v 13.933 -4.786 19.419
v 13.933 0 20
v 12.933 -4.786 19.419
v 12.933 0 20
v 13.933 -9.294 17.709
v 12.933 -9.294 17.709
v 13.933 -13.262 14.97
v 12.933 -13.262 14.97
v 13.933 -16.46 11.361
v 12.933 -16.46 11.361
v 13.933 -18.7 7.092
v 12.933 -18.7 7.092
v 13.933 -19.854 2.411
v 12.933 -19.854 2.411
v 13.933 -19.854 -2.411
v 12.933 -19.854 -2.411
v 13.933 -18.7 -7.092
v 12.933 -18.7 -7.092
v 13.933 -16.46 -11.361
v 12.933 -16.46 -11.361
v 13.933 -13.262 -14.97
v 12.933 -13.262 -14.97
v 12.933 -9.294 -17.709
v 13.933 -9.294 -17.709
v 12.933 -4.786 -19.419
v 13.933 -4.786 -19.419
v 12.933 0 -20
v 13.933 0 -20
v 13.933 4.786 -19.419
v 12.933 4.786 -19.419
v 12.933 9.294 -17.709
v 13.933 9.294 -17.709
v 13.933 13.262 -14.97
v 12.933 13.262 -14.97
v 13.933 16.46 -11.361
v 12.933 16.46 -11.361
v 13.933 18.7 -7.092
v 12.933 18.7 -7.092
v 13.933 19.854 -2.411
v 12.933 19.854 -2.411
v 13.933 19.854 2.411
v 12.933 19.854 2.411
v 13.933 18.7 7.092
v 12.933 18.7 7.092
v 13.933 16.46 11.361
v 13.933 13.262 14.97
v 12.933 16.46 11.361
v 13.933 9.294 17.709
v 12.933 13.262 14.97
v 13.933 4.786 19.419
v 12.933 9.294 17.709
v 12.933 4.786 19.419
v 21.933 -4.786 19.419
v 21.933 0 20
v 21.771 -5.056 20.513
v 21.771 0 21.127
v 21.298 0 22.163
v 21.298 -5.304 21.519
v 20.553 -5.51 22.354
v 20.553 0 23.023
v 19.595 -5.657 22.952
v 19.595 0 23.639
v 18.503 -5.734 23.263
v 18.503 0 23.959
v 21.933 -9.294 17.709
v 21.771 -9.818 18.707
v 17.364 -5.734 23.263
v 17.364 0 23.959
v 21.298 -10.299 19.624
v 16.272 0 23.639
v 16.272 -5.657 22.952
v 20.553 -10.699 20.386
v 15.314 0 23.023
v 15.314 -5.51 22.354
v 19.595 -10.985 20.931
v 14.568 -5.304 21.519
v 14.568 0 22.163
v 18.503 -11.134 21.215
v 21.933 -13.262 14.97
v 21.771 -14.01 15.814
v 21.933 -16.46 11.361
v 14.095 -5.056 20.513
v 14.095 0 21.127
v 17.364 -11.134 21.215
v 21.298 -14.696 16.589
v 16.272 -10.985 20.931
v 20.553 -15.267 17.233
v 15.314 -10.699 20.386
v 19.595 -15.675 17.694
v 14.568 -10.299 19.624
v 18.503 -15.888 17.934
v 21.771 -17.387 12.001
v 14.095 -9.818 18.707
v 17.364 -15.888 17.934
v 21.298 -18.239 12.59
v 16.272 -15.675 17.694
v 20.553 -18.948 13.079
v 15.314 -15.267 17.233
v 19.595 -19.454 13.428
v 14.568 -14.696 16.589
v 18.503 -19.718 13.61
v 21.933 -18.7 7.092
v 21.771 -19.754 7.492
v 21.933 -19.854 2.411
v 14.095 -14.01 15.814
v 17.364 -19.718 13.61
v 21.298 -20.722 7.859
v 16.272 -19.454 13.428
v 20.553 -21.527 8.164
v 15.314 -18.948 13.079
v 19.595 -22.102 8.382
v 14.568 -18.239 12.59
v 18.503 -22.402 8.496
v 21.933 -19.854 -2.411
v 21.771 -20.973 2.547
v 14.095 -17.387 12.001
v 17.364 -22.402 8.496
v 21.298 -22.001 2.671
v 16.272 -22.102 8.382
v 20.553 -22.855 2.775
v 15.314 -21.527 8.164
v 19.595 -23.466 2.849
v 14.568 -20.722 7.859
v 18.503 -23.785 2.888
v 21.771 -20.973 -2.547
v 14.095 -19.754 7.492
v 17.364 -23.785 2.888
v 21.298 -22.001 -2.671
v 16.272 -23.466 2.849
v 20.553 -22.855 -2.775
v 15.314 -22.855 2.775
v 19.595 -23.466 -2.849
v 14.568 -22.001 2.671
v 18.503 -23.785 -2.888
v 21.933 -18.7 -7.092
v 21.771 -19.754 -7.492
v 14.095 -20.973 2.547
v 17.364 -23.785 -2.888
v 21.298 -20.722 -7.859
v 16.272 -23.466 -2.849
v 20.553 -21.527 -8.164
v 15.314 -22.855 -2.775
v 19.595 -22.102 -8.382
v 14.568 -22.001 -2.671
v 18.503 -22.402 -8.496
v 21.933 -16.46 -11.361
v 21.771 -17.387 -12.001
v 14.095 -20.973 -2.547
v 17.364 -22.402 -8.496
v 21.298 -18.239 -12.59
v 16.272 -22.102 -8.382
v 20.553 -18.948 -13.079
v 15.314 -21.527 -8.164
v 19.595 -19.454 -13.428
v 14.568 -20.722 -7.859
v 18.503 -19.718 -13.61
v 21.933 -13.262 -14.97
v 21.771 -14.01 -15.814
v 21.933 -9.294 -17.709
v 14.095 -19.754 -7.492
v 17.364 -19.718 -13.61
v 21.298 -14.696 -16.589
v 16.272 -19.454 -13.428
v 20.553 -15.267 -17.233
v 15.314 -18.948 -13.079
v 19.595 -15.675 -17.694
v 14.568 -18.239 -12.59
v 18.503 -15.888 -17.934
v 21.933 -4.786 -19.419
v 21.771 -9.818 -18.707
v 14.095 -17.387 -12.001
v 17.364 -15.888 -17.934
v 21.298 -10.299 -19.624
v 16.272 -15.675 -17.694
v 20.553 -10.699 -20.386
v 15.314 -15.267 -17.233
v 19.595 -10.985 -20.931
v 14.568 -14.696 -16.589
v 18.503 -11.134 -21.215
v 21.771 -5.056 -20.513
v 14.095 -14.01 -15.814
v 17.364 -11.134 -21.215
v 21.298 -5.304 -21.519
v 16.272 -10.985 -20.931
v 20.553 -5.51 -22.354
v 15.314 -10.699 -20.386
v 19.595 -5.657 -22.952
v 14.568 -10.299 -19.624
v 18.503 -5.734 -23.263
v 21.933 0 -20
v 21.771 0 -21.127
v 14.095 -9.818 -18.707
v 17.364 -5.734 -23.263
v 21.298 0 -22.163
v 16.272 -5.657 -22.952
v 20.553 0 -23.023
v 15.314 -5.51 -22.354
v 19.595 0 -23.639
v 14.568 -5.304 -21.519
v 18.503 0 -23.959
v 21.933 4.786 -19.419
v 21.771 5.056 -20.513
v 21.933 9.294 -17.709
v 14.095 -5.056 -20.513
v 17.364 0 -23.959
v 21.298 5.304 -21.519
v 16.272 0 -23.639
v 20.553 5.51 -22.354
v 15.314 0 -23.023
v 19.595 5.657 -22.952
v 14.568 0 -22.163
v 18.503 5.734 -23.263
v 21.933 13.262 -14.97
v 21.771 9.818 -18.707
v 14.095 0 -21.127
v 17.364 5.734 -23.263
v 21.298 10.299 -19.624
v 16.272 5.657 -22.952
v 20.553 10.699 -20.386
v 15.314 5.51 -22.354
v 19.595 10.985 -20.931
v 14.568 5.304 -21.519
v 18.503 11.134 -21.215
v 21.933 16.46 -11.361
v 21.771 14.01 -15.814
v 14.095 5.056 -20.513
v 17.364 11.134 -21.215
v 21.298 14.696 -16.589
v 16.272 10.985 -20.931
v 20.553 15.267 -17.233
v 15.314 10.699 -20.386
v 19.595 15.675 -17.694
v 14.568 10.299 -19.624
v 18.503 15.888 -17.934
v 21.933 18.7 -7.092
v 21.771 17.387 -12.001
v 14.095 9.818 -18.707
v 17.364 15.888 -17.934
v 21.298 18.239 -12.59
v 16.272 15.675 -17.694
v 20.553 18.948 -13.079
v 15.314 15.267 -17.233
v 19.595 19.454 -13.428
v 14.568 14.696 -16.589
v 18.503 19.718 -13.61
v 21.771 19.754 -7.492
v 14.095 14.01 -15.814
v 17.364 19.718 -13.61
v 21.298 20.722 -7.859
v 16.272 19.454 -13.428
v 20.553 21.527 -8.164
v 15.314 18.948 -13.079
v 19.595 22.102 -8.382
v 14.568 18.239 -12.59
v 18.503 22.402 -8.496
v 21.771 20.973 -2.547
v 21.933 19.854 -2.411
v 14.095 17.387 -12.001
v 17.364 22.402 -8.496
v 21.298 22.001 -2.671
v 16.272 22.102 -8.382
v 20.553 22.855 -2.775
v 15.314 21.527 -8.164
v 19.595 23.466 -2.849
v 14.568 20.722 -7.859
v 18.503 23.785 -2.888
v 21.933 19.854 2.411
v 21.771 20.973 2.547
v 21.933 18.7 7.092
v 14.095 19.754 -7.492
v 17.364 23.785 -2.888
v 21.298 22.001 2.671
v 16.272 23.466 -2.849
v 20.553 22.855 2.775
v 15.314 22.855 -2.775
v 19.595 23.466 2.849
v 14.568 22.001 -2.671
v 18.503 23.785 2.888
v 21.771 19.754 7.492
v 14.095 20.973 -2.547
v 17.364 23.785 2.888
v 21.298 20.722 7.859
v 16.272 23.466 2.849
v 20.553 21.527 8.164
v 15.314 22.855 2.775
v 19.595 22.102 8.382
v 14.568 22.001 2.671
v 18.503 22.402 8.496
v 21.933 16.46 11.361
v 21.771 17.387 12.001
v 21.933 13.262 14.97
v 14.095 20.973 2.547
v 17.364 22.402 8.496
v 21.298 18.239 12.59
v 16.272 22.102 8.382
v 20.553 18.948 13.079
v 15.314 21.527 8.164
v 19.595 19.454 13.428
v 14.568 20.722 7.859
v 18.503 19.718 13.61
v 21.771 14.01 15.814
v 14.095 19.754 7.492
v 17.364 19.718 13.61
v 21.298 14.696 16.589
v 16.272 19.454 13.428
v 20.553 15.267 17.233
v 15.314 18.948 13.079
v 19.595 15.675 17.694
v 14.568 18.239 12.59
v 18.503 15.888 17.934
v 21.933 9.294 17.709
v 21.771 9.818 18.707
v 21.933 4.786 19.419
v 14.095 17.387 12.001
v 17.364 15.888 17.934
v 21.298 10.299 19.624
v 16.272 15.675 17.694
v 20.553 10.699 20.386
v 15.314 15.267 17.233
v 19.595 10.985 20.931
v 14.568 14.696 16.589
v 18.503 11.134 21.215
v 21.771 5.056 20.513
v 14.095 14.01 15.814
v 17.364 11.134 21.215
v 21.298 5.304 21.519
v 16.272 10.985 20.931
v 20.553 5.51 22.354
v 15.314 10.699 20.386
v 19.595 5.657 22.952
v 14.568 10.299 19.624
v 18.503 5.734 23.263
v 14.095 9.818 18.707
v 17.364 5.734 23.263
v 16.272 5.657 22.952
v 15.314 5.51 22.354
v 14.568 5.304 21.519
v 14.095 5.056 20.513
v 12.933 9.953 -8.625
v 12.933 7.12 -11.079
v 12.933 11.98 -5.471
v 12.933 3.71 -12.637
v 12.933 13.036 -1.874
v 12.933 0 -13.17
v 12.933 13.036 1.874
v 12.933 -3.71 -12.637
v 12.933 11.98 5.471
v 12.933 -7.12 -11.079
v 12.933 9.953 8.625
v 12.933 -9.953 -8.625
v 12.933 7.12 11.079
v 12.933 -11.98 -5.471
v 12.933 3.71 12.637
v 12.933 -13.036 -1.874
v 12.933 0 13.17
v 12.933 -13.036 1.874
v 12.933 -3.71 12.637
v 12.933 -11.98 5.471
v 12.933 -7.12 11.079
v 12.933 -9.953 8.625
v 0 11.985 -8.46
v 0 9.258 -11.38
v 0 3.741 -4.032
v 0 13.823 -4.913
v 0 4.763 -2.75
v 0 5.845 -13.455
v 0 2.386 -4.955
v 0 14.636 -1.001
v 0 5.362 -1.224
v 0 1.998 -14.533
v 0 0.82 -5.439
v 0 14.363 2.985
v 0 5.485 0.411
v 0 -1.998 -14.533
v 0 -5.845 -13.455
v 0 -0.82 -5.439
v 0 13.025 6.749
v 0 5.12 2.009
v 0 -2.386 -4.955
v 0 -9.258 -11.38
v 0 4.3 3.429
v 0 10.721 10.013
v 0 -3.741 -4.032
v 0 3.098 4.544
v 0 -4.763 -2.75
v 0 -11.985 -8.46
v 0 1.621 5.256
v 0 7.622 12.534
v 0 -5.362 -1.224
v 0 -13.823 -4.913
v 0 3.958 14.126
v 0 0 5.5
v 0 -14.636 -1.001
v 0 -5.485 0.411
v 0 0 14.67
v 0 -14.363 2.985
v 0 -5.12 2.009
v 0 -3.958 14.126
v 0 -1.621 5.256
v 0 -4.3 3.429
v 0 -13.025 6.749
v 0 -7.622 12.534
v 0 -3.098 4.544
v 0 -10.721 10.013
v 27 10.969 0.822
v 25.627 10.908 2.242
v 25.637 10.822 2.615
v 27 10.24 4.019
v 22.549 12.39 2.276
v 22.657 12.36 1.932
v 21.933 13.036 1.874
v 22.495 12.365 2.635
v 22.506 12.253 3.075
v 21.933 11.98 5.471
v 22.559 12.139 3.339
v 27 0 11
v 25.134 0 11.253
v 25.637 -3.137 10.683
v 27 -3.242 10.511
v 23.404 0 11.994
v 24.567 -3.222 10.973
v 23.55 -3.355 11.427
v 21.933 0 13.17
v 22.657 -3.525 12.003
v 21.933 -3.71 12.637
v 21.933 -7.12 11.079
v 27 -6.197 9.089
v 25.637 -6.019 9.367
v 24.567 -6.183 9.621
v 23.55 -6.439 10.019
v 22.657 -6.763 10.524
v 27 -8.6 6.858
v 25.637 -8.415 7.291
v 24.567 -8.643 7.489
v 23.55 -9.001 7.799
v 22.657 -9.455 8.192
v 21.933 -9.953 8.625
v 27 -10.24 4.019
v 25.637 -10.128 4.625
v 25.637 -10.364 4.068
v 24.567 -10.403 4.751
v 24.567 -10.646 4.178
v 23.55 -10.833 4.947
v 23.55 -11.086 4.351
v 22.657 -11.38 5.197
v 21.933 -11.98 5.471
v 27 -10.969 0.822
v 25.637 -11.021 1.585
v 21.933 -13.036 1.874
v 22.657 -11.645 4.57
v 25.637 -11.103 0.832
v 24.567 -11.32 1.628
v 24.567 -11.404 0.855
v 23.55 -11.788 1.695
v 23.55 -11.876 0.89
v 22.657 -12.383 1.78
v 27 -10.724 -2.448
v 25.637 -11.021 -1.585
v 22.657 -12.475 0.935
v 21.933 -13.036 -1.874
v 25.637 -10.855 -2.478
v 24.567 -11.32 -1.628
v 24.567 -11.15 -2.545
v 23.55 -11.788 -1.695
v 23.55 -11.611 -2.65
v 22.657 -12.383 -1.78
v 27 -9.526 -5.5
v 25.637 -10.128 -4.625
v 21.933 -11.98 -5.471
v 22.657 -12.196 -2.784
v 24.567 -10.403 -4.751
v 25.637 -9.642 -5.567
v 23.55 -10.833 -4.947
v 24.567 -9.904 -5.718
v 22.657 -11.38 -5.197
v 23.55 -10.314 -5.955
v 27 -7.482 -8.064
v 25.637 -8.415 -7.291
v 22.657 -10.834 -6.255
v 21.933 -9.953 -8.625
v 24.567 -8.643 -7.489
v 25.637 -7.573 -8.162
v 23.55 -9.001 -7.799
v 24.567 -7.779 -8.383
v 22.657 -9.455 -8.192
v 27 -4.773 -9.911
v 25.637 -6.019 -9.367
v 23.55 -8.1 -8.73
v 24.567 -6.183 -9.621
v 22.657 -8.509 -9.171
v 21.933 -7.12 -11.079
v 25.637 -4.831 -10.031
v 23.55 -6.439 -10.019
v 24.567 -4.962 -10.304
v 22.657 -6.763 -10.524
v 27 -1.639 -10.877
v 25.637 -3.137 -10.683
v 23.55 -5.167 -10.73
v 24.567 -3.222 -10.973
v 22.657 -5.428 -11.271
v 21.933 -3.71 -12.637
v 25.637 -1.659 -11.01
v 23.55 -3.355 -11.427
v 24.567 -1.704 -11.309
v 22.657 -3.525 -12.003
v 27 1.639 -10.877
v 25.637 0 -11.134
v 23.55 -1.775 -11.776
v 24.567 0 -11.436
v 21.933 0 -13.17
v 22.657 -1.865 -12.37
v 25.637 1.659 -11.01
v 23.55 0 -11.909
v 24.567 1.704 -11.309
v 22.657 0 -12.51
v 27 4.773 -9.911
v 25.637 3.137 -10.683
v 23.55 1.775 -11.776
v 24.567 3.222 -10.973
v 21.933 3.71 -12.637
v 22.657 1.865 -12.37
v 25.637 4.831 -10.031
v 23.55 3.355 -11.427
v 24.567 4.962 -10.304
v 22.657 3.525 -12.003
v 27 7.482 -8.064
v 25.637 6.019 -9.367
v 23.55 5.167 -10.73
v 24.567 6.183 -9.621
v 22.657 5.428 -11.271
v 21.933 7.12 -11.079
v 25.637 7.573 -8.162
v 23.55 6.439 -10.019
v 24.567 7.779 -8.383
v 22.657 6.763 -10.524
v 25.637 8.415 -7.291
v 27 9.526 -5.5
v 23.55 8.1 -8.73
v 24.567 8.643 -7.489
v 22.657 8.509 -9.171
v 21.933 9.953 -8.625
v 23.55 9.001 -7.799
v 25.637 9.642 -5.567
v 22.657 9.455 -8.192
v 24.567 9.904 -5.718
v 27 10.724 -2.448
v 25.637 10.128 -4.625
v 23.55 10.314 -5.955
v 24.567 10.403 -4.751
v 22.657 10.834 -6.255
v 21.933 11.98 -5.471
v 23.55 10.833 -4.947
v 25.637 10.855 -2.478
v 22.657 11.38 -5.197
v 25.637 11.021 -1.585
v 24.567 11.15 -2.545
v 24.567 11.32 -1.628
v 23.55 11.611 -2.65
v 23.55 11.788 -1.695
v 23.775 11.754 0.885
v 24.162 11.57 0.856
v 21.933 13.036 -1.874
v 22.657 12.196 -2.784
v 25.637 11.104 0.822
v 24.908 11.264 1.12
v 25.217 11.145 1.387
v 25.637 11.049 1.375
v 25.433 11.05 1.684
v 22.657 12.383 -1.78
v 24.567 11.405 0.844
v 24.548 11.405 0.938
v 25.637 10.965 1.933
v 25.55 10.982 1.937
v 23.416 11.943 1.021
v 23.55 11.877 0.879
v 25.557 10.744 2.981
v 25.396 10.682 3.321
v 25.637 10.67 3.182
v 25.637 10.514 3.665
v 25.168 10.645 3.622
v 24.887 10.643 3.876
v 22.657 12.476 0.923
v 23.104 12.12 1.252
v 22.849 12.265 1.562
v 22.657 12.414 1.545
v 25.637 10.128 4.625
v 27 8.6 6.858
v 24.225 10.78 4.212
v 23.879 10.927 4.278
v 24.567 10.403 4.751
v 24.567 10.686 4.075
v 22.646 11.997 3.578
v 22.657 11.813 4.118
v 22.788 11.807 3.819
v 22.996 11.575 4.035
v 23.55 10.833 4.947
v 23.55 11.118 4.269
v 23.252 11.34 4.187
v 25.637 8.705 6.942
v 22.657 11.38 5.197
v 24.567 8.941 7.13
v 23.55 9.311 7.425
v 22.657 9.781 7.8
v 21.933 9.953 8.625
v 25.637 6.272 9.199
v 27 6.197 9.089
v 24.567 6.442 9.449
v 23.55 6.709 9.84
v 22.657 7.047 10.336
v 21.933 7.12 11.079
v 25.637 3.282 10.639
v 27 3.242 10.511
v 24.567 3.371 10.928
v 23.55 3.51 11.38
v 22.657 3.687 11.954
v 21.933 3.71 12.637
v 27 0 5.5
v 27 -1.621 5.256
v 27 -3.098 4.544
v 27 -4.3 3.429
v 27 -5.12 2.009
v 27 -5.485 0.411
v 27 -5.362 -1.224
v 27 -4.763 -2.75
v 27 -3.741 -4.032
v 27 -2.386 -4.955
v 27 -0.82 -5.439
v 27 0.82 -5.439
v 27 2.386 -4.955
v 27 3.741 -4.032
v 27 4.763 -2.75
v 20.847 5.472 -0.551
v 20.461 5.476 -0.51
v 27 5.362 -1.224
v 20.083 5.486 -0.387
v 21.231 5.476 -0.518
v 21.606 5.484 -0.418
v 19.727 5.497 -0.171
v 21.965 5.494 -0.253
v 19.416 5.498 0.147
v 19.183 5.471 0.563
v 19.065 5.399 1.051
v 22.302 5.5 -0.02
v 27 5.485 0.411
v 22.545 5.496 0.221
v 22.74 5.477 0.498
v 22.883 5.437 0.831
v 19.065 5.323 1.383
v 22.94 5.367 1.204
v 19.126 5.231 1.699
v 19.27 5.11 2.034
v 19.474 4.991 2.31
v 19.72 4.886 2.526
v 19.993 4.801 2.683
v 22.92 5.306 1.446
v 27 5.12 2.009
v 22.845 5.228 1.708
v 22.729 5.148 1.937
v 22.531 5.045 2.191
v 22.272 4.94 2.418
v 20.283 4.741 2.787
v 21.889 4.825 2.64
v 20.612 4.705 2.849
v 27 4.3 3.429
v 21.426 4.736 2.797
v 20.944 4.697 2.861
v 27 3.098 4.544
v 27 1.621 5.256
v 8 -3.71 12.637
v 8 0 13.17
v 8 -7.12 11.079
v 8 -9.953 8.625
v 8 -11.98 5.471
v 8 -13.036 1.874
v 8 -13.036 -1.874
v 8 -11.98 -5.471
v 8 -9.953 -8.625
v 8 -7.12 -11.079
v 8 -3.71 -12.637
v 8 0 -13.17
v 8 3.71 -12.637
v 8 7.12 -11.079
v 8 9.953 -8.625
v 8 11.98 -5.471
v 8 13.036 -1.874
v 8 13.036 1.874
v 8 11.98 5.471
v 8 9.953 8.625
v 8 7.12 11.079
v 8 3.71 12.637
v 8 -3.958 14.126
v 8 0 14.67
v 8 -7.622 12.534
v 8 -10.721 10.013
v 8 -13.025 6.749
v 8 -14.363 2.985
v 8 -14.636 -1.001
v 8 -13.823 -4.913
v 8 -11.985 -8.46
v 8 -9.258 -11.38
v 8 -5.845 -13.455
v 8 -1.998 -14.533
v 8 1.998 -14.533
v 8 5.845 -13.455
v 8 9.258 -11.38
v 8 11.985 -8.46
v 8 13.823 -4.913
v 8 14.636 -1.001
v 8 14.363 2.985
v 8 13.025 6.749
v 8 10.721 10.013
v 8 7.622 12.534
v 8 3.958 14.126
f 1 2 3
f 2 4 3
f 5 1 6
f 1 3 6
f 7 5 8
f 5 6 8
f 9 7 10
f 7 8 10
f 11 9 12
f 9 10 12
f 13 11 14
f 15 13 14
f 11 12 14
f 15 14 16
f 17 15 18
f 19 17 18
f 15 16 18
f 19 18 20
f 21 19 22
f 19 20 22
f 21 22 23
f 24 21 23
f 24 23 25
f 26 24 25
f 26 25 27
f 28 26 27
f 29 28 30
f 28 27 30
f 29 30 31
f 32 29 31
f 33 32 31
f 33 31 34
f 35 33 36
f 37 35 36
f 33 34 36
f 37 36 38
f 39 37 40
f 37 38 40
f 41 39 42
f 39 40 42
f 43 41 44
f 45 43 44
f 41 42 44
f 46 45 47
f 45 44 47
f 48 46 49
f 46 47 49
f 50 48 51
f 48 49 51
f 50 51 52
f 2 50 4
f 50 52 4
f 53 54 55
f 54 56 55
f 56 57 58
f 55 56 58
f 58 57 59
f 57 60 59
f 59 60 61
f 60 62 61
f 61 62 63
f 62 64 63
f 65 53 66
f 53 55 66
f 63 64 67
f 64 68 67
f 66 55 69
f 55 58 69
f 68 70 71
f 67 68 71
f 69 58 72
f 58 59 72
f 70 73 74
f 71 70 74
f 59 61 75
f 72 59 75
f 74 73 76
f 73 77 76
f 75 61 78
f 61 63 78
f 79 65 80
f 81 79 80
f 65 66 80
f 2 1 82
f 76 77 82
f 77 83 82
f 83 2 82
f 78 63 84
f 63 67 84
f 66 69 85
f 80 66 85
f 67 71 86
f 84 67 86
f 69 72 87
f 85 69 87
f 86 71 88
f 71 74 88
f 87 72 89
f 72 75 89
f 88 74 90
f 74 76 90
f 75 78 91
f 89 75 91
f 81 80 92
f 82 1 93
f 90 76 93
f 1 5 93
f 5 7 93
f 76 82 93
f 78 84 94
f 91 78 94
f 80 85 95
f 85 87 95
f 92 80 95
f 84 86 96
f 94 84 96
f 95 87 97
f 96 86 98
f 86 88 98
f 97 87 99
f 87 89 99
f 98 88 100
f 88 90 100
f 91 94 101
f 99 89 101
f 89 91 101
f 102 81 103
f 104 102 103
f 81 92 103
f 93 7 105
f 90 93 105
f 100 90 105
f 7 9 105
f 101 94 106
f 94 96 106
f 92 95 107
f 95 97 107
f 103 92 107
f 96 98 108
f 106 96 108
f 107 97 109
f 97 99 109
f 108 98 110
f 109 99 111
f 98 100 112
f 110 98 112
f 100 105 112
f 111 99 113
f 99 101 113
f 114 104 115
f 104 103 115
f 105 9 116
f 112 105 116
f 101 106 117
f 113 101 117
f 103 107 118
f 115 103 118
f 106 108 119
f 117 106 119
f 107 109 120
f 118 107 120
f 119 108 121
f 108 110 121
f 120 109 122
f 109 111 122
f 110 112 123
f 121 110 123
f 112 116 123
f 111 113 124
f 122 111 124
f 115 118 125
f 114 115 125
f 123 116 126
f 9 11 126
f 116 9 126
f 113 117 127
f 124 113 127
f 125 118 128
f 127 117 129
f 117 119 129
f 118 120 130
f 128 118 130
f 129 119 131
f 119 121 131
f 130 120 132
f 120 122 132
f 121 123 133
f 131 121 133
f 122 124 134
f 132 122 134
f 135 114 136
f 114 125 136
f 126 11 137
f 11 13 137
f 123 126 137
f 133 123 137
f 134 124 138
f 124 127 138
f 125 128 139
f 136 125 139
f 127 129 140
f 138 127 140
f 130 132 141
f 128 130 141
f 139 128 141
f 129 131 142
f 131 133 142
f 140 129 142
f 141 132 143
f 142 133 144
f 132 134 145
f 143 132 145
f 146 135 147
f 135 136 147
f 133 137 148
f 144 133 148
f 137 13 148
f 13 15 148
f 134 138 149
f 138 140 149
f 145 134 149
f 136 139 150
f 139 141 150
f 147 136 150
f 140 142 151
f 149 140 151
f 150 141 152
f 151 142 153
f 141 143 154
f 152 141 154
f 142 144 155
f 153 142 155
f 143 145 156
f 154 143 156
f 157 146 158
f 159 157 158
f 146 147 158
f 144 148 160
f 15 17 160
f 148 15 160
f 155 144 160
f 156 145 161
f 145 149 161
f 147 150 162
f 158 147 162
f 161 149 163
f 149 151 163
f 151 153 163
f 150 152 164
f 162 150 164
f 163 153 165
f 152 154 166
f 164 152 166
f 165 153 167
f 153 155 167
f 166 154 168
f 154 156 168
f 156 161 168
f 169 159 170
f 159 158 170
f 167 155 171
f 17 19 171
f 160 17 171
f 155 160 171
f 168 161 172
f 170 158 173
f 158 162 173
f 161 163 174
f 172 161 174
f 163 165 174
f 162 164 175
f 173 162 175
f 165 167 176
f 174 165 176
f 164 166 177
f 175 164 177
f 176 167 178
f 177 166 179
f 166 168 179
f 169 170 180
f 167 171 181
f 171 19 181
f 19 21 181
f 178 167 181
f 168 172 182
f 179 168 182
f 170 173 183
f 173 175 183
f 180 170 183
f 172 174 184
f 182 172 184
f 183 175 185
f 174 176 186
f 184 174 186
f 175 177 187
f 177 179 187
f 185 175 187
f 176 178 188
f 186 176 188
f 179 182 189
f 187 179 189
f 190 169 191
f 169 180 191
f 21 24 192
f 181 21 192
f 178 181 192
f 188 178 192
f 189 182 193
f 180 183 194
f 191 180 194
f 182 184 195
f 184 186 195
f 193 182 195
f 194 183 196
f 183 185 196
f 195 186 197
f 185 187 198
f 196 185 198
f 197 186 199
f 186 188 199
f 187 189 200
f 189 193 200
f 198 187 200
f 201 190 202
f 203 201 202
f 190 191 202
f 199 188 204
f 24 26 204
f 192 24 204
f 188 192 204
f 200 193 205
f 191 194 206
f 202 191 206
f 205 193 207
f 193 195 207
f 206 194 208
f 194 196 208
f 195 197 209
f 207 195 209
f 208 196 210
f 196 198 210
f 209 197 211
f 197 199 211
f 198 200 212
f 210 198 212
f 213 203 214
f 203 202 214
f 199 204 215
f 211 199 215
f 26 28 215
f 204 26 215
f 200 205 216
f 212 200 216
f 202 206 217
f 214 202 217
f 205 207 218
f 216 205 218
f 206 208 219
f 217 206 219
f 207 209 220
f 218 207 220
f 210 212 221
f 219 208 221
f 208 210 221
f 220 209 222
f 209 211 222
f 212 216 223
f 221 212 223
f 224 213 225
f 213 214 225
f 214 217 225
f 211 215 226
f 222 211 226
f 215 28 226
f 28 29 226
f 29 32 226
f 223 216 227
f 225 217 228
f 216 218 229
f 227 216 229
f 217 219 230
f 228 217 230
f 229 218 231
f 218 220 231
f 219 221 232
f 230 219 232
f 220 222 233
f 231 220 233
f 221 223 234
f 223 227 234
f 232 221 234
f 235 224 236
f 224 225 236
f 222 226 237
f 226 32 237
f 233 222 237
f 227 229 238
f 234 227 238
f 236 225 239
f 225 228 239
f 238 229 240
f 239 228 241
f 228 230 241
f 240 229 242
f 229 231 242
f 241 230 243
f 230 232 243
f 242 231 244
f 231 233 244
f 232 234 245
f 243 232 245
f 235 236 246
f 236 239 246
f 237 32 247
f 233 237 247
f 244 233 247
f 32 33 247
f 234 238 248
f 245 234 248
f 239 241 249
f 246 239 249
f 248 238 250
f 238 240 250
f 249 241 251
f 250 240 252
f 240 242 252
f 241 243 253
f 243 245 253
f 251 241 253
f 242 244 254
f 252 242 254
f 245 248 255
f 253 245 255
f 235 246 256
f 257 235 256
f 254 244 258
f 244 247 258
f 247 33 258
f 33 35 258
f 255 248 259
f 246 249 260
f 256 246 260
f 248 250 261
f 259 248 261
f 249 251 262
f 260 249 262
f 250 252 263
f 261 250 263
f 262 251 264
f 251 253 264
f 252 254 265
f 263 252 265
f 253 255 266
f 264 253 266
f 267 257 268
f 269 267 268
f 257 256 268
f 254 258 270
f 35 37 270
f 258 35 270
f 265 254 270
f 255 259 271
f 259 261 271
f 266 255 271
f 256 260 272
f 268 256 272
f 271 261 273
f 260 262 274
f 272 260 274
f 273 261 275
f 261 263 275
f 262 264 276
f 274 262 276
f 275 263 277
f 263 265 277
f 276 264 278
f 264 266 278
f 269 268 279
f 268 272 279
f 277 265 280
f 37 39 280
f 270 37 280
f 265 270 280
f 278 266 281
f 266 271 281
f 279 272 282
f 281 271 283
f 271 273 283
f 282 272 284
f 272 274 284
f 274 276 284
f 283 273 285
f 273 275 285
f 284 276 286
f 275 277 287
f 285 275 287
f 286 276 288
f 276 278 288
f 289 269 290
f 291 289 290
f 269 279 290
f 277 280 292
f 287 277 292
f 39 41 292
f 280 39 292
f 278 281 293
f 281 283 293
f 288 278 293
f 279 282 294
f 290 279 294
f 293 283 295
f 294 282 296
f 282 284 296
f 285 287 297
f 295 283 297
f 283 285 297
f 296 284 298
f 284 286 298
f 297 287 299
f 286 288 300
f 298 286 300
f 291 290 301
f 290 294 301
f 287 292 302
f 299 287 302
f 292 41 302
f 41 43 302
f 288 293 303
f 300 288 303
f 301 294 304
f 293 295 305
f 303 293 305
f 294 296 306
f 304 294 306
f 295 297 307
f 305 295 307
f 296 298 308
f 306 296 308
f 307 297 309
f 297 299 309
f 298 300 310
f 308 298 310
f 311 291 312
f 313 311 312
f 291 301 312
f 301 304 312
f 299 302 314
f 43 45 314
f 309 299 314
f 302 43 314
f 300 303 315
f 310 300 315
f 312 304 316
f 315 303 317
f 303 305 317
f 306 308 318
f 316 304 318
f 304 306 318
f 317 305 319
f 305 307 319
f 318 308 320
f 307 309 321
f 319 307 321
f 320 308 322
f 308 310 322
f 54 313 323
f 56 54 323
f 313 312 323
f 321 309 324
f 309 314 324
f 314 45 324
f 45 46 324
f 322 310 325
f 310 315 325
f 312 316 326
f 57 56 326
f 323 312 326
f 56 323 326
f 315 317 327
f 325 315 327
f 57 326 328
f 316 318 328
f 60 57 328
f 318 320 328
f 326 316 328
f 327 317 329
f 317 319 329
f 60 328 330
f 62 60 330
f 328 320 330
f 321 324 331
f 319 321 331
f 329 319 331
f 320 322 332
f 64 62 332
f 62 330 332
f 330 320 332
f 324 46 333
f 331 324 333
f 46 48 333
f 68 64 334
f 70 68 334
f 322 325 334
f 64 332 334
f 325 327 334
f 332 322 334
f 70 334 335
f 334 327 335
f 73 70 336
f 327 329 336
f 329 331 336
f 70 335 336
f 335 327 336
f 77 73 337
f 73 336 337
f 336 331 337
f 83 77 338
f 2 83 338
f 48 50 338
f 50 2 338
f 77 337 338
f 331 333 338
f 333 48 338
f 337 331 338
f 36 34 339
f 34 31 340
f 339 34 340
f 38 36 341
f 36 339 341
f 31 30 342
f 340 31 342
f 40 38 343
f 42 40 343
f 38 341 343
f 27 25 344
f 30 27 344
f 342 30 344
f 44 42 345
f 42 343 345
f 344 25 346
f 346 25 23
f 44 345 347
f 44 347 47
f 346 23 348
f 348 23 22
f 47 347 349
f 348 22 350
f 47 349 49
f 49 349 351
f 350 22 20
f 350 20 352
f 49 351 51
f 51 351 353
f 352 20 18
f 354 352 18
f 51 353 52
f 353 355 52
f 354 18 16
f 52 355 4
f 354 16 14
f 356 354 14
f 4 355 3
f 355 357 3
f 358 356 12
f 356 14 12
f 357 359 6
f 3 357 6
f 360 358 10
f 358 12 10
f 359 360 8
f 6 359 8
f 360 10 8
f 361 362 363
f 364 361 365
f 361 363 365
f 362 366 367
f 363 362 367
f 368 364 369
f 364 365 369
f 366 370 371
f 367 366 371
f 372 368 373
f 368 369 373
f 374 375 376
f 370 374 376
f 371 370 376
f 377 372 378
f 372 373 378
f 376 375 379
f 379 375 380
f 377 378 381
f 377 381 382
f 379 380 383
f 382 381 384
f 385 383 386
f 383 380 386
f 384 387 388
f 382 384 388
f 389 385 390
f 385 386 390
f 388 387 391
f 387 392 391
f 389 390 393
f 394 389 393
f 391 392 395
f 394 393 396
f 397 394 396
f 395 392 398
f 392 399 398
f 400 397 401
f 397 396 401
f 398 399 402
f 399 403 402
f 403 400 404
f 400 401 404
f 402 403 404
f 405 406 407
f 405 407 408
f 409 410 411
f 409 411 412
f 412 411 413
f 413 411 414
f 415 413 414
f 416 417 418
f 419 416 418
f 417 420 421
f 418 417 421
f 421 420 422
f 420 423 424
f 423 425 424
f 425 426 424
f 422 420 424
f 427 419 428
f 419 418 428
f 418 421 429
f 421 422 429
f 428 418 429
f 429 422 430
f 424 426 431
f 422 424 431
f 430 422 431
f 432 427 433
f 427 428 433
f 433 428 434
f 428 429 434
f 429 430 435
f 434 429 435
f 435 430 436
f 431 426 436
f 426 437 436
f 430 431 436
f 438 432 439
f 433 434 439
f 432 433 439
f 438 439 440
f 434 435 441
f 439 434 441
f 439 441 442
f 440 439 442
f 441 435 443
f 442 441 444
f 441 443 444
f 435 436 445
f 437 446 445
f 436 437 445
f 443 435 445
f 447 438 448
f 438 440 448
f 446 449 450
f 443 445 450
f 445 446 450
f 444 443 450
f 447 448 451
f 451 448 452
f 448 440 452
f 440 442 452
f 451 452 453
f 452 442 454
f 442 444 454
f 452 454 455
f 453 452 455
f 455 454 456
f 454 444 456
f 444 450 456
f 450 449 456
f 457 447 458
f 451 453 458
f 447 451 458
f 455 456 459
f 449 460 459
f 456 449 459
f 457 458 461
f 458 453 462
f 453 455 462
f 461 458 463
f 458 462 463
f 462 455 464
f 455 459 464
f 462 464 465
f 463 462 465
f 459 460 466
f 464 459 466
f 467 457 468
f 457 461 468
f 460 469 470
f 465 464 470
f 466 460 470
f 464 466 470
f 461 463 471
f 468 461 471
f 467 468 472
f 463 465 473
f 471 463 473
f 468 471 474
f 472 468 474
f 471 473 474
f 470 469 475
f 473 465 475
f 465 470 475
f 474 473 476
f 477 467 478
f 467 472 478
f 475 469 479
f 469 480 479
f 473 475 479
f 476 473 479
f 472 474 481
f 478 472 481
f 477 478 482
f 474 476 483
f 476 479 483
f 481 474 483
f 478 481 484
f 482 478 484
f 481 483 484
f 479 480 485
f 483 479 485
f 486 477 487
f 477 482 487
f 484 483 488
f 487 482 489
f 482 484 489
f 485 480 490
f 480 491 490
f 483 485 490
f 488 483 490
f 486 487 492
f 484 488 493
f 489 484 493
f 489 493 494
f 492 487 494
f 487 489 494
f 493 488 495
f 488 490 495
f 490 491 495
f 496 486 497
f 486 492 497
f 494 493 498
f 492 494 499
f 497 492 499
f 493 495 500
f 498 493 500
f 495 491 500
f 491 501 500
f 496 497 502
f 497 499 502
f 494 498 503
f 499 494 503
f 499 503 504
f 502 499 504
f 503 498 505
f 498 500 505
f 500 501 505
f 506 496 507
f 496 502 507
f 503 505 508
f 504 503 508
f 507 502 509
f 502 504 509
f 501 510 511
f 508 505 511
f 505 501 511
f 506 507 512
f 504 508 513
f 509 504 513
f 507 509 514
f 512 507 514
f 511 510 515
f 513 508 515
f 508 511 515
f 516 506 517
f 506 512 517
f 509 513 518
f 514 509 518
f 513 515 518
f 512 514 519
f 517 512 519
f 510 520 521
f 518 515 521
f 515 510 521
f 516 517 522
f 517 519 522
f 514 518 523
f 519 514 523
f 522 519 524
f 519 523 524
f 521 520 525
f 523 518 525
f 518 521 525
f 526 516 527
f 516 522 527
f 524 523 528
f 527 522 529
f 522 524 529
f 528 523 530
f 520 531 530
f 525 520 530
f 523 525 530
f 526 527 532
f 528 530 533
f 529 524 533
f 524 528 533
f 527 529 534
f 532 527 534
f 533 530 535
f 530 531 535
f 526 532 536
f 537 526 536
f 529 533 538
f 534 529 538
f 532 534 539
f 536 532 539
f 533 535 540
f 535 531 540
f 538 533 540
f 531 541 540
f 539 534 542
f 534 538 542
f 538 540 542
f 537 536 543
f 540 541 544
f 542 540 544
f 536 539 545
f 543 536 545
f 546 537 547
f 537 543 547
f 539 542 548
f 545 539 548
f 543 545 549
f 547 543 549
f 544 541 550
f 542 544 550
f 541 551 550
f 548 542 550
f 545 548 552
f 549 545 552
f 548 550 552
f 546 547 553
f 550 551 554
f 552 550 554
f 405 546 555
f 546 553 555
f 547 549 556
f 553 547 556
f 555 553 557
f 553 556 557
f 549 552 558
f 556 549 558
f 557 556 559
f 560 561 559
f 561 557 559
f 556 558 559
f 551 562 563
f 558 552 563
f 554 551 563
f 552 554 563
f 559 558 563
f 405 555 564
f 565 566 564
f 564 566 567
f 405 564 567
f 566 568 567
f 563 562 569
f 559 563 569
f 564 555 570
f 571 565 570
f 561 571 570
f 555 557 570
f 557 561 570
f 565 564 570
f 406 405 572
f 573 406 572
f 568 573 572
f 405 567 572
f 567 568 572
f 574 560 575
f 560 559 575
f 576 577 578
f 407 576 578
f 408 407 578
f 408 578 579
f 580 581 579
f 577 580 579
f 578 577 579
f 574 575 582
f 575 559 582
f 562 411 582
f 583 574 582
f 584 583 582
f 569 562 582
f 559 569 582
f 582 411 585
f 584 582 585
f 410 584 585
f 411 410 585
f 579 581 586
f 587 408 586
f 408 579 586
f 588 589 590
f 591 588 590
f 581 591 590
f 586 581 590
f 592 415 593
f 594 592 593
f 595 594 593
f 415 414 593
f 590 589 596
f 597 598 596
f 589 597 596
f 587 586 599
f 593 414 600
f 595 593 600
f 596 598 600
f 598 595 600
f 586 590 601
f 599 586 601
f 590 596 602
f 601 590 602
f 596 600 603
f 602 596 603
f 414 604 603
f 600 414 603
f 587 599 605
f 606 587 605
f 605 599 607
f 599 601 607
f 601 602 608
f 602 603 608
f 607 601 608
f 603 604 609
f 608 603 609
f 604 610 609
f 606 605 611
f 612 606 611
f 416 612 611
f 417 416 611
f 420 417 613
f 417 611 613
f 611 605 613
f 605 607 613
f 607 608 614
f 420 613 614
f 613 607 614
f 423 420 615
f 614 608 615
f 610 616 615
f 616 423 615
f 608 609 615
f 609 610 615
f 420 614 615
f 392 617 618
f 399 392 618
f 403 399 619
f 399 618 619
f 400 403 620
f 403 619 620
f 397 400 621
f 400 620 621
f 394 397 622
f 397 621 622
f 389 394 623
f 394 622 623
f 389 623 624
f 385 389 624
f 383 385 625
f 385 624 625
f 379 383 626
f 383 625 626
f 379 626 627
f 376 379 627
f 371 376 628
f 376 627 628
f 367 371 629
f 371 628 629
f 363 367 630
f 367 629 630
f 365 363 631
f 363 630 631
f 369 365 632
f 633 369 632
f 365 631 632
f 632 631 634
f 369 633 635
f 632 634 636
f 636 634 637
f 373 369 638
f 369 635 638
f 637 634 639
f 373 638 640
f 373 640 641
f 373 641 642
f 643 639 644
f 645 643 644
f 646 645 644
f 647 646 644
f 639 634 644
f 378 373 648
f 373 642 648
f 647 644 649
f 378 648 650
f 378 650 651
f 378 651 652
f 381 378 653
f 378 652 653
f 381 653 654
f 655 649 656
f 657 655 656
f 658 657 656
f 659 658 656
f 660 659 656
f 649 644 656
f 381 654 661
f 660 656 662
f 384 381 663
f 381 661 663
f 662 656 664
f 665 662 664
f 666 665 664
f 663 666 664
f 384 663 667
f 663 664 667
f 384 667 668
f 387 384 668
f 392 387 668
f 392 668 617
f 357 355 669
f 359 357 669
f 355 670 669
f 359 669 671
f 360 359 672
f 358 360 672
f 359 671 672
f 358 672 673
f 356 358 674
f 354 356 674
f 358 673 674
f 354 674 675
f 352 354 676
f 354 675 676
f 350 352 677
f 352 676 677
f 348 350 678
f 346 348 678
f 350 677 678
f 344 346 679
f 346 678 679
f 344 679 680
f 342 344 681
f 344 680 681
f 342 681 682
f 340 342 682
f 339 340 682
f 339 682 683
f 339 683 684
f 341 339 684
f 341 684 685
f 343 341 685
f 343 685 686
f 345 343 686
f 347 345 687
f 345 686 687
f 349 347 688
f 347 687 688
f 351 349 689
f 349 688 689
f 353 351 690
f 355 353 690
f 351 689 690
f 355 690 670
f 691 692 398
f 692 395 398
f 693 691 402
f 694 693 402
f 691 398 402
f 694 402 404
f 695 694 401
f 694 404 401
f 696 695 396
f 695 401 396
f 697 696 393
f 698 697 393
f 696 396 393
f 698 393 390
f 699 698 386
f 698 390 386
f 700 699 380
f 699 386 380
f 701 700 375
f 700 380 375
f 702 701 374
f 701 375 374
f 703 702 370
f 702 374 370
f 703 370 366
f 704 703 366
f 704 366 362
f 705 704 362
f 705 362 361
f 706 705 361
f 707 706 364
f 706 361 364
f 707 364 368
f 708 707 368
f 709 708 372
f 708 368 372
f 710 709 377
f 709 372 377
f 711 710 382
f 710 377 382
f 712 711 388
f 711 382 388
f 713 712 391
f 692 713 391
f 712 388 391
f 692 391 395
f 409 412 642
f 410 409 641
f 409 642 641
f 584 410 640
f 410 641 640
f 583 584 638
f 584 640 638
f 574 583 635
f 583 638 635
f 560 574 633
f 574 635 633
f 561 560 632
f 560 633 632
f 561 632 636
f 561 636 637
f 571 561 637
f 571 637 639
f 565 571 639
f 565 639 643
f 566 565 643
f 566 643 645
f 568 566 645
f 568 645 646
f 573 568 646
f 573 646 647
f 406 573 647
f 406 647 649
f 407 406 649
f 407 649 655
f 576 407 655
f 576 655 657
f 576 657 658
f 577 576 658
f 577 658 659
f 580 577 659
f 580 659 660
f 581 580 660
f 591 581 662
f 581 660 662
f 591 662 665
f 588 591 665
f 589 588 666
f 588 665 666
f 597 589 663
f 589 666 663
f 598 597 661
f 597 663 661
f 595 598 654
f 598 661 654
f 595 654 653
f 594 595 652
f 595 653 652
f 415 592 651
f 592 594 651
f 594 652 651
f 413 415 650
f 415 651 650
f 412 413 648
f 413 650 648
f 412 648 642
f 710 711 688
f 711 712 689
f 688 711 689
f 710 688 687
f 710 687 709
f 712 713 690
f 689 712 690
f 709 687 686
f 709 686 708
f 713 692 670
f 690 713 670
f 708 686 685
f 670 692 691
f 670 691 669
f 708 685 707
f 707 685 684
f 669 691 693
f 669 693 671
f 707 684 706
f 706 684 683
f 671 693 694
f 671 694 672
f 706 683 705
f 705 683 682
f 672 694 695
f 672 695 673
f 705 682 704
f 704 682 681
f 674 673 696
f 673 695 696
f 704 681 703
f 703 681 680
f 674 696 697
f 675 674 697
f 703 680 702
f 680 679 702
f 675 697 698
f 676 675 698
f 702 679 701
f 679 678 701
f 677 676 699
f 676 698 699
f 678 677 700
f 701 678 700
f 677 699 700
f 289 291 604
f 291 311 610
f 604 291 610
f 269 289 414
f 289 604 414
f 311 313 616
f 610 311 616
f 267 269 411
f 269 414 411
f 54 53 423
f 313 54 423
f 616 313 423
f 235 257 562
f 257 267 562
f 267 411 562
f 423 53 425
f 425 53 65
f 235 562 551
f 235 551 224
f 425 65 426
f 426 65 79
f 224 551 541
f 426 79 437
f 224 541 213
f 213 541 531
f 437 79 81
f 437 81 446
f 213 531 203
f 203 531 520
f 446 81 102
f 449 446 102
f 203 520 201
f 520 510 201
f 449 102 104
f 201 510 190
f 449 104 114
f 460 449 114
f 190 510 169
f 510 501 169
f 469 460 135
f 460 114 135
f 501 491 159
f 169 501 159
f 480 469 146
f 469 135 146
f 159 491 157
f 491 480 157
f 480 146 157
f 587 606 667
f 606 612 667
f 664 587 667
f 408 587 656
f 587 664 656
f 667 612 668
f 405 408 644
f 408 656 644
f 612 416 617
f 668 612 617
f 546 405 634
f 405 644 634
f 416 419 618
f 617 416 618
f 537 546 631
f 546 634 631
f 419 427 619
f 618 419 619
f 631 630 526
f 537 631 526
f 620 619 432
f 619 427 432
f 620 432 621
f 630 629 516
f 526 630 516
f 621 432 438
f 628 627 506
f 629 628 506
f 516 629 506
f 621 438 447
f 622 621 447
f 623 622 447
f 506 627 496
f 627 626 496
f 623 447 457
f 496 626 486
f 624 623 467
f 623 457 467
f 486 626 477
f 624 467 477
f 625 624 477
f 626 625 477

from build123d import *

# Parameters (mm, degrees)
F_3_5_3_5_DIAMETER_HOLE1_D     = 3.5
F_3_5_3_5_DIAMETER_HOLE1_DEPTH = 12
F_3_5_3_5_DIAMETER_HOLE1_TIP   = 1.75


with BuildPart() as part:
    # Sketch2 → Revolve1 (revolve)
    with BuildSketch(Plane.XY, mode=Mode.PRIVATE) as revolve1_sk:
        with BuildLine():
            Line((0, 5.5), (27, 5.5))
            Line((27, 5.5), (27, 11))
            ThreePointArc((27, 11), (24.244097244, 11.565328291), (21.93333443, 13.17))
            Line((21.93333443, 13.17), (21.93333443, 20))
            ThreePointArc((21.93333443, 20), (17.93333443, 24), (13.93333443, 20))
            Line((13.93333443, 20), (12.93333443, 20))
            Line((12.93333443, 20), (12.93333443, 13.17))
            Line((12.93333443, 13.17), (8, 13.17))
            Line((8, 13.17), (8, 14.67))
            Line((8, 14.67), (0, 14.67))
            Line((0, 14.67), (0, 5.5))
        make_face()
    revolve(revolve1_sk.sketch.rotate(Axis((0, 0, 0), (1, 0, 0)), 90), axis=Axis((0, 0, 0), (1, 0, 0)))

    # Ø3.5 (3.5) Diameter Hole1
    with Locations(Plane(origin=(23.970221342, 11.398844084, 2.591218084), x_dir=(0.897145620837, -0.441734914867, 0), z_dir=(0.432825522508, 0.879051007823, 0.19982840817))):
        with Locations((0, 0)):
            Hole(F_3_5_3_5_DIAMETER_HOLE1_D / 2, depth=F_3_5_3_5_DIAMETER_HOLE1_DEPTH)
            with Locations((0, 0, -(F_3_5_3_5_DIAMETER_HOLE1_DEPTH + F_3_5_3_5_DIAMETER_HOLE1_TIP / 2))):  # 90° drill point
                Cone(0, F_3_5_3_5_DIAMETER_HOLE1_D / 2, F_3_5_3_5_DIAMETER_HOLE1_TIP, mode=Mode.SUBTRACT)


solid = part.part
